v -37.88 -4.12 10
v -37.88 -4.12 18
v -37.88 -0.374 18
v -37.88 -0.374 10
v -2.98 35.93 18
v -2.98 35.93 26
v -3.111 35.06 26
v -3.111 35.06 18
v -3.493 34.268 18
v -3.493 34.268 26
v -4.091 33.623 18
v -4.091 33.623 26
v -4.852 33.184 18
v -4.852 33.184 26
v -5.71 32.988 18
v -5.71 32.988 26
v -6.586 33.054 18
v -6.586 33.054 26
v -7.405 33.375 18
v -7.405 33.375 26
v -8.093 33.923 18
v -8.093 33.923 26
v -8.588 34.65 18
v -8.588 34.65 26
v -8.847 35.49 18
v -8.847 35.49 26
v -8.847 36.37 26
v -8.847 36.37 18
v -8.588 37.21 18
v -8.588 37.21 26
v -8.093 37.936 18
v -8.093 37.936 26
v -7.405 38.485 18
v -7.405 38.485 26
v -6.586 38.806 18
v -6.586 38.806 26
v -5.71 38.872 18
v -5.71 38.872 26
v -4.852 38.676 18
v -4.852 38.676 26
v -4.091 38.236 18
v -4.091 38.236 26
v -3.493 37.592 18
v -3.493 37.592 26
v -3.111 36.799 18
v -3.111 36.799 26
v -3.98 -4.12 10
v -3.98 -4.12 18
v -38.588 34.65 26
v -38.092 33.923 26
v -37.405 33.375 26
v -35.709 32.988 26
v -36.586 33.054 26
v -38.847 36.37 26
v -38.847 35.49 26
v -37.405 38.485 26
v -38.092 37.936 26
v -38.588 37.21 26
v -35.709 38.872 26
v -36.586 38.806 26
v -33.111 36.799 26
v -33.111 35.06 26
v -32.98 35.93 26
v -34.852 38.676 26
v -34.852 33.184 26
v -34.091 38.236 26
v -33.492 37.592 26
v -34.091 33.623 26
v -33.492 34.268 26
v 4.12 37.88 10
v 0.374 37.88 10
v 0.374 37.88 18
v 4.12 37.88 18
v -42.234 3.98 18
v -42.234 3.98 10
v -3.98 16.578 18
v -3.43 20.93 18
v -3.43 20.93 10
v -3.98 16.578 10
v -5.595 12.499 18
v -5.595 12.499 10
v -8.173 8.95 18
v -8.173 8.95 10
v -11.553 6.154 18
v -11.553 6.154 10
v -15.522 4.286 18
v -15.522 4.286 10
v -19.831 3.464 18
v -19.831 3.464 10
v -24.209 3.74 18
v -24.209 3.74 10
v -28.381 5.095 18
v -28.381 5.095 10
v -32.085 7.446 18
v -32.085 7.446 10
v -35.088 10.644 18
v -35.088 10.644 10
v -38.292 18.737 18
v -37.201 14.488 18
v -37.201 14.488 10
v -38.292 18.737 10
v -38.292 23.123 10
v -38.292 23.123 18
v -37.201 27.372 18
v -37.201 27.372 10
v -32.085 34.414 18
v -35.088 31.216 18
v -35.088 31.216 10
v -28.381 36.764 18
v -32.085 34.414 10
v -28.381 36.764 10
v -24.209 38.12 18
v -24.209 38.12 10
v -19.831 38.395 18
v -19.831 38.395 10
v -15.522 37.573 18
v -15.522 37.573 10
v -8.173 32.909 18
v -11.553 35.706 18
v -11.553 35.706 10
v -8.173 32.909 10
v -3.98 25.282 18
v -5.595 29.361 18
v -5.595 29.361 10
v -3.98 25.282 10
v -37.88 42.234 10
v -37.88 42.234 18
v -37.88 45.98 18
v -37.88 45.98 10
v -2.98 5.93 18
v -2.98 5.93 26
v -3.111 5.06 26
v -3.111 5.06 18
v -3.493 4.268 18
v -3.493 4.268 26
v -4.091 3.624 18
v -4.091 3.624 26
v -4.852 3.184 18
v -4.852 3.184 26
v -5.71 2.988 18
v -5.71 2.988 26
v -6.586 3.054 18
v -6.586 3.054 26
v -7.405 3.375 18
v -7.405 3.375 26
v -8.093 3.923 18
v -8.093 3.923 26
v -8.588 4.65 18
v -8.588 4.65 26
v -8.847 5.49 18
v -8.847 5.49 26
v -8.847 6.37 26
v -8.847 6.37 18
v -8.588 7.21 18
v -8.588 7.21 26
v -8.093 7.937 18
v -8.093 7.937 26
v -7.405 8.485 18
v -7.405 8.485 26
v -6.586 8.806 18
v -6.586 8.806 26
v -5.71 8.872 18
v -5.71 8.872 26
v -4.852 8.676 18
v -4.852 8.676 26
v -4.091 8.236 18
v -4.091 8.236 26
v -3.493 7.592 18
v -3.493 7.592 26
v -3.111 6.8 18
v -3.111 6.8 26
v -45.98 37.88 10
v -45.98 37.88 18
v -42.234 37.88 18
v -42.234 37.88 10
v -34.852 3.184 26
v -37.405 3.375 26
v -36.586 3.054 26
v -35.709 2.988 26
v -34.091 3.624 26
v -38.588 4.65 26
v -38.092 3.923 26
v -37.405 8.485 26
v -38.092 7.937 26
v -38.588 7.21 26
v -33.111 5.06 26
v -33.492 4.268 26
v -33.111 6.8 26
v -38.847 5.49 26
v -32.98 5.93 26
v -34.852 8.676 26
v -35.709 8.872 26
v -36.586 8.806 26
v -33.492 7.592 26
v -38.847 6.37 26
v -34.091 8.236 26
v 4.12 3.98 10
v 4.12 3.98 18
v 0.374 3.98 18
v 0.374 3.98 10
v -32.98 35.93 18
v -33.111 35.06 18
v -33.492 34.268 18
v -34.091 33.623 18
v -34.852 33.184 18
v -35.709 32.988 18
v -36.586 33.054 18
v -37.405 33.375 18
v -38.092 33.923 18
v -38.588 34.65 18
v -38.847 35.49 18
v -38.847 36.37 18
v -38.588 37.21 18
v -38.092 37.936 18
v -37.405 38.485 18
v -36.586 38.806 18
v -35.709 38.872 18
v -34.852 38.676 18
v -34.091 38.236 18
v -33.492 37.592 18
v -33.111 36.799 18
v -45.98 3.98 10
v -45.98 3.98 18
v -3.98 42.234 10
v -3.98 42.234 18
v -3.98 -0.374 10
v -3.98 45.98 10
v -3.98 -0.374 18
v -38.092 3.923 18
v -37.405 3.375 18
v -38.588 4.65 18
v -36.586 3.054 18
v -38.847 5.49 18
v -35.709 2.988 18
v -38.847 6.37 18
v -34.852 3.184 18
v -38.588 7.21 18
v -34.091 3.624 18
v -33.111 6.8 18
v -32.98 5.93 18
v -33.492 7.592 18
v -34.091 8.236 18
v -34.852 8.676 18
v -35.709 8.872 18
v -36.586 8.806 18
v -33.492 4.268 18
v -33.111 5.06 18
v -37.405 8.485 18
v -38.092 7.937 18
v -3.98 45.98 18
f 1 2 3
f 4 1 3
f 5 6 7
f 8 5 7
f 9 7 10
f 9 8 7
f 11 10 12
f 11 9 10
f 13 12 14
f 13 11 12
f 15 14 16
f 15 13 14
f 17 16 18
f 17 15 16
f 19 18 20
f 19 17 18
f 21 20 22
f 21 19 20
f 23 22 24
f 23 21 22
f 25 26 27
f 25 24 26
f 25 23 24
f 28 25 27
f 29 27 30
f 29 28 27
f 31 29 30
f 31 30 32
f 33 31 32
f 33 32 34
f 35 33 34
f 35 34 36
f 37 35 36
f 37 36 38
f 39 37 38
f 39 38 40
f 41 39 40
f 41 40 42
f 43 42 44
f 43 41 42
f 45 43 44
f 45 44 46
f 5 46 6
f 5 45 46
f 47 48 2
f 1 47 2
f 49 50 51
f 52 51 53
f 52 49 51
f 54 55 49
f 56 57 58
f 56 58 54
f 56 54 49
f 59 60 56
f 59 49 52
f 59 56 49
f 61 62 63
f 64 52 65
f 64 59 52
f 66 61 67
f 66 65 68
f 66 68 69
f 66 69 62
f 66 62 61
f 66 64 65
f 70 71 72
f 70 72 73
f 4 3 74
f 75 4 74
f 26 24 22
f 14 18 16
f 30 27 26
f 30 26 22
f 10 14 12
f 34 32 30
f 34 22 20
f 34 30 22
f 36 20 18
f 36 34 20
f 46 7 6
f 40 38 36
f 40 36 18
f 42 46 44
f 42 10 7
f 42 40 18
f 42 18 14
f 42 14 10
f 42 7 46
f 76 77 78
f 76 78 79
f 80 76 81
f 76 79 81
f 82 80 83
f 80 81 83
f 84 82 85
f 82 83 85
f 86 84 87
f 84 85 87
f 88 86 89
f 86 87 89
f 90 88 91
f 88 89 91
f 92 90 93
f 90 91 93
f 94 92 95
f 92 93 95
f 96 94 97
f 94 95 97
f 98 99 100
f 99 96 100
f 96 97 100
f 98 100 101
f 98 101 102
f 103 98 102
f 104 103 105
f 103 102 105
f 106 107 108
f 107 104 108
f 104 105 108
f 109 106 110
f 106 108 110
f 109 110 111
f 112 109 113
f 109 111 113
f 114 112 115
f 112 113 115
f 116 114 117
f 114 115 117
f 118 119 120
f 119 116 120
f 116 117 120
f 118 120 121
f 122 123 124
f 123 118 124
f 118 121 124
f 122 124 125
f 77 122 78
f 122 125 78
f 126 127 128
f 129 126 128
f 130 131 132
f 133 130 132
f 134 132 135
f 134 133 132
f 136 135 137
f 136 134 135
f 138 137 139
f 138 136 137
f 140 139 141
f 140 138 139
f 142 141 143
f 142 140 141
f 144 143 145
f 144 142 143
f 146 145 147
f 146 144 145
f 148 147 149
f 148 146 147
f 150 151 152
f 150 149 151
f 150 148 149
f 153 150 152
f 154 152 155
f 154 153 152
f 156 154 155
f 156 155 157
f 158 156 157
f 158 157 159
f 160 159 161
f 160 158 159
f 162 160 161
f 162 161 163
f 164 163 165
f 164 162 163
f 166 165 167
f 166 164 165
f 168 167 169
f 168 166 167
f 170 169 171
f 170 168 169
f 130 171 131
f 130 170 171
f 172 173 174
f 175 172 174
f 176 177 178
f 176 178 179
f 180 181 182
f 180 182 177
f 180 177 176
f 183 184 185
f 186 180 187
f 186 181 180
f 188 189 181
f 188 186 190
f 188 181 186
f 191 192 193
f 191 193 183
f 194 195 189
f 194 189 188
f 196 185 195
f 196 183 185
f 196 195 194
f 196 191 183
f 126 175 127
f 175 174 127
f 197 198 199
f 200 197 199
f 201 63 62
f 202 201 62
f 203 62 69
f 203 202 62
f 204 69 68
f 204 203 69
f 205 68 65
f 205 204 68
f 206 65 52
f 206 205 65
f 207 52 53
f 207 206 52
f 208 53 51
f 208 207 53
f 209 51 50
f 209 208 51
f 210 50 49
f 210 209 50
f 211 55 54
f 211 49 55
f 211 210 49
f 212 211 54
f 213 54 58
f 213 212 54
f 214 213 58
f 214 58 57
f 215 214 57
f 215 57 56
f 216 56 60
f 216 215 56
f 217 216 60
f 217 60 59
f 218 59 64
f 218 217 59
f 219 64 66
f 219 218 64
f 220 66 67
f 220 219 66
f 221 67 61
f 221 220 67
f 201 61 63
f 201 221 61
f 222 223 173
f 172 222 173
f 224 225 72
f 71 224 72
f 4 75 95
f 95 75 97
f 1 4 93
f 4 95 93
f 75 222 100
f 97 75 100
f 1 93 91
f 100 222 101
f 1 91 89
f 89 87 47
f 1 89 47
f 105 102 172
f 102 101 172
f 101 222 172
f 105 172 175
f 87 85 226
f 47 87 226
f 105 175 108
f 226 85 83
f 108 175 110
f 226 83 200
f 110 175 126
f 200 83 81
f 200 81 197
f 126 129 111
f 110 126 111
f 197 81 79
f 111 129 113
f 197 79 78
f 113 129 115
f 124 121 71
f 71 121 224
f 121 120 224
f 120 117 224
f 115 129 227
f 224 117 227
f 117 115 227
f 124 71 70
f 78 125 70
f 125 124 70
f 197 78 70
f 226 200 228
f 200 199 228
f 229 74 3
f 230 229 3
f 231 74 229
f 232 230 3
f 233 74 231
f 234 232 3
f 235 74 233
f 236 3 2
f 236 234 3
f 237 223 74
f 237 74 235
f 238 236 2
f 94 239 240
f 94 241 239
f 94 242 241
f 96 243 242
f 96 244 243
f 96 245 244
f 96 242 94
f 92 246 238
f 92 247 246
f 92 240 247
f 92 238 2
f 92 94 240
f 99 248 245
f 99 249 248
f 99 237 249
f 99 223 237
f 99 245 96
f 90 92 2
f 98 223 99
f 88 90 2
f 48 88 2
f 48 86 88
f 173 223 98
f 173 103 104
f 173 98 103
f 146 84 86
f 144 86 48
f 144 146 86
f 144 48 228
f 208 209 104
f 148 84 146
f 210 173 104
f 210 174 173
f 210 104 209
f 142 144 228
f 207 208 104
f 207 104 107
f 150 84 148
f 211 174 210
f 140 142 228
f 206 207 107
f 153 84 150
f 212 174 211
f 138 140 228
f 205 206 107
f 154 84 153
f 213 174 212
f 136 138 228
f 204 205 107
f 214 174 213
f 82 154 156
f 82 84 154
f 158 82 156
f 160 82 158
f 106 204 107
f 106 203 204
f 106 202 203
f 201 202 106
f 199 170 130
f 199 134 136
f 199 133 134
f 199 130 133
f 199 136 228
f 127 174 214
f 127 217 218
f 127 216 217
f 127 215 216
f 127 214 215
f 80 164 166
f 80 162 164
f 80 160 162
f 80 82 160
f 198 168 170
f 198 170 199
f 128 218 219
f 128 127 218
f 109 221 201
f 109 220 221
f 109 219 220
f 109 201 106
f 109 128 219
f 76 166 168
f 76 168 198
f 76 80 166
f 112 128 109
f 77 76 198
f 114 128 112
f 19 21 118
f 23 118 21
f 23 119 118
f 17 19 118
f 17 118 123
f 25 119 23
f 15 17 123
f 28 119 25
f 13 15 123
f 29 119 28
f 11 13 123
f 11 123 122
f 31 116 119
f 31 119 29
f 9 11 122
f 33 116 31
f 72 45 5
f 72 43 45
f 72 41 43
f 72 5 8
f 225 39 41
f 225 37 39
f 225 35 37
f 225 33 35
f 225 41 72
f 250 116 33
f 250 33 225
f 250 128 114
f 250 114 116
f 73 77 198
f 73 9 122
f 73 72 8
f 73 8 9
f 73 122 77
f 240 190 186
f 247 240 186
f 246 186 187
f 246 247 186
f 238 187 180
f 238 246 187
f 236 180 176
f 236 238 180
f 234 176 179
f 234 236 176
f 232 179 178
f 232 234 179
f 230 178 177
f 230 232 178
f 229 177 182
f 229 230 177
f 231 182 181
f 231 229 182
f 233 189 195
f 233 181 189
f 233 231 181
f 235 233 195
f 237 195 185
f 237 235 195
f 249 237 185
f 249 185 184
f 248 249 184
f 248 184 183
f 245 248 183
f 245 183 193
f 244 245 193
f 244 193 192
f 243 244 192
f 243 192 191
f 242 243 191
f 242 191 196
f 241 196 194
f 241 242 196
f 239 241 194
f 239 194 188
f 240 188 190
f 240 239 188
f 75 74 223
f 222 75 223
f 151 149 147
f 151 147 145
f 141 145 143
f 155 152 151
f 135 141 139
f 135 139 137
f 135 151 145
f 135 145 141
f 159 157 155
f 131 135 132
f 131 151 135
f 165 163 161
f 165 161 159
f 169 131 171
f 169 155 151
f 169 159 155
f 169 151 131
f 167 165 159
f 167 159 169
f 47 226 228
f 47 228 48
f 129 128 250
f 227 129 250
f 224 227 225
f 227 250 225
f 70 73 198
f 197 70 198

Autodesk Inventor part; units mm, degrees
ref_plane "YZ Plane" through (0, 0, 0) normal (1, 0, 0) x (0, 1, 0)
ref_plane "XZ Plane" through (0, 0, 0) normal (0, 1, 0) x (-1, 0, 0)
ref_plane "Work Plane1" through (0, 0, 10) normal (0, 0, 1) x (1, 0, 0)
sketch "Sketch1" plane through (0, 0, 10) normal (0, 0, 1) x (1, 0, 0)
  line L0 (-4.0299, -0.3538) -> (-2.2322, 1.4439) construction
  arc A0 (-1.4439, 2.2322) -> (-2.2322, 1.4439) centre (-0.9299, 0.9299) ccw construction
  line L1 (-1.4439, 2.2322) -> (0.3538, 4.0299) construction
  line L2 (-37.8299, 42.8299) -> (-37.8299, 37.8299) construction
  line L3 (-37.8299, 37.8299) -> (-42.9208, 37.8299) construction
  line L4 (-37.8299, 42.2137) -> (-37.8299, 45.8299) construction
  line L5 (-37.8299, 45.8299) -> (-4.0299, 45.8299) construction
  line L6 (-4.0299, 45.8299) -> (-4.0299, 42.2137) construction
  line L7 (-4.0299, 4.0299) -> (0.3538, 4.0299) projected
  circle A1 centre (-20.9299, 20.9299) radius 17.5 projected
  line L8 (-20.9299, 58.9723) -> (17.1124, 20.9299) construction
  line L9 (17.1124, 20.9299) -> (-20.9299, -17.1124) construction
  line L10 (-20.9299, -17.1124) -> (-58.9723, 20.9299) construction
  line L11 (-58.9723, 20.9299) -> (-20.9299, 58.9723) construction
  line L12 (-20.9299, 58.9723) -> (-20.9299, -17.1124) construction
  line L13 (17.1124, 20.9299) -> (-58.9723, 20.9299) construction
  line L14 (-20.9299, 58.9723) -> (32.8701, 58.9723) construction
  line L15 (-43.4299, 43.4299) -> (1.5701, 43.4299) construction
  line L16 (1.5701, 43.4299) -> (1.5701, -1.5701) construction
  line L17 (1.5701, -1.5701) -> (-43.4299, -1.5701) construction
  line L18 (-43.4299, -1.5701) -> (-43.4299, 43.4299) construction
  line L19 (-43.4299, 43.4299) -> (1.5701, -1.5701) construction
  line L20 (1.5701, 43.4299) -> (-43.4299, -1.5701) construction
  line L21 (-43.4299, 5.3876) -> (-43.4299, 36.4723)
  line L22 (-43.4299, 36.4723) -> (-36.4723, 43.4299)
  line L23 (-36.4723, 43.4299) -> (-5.3876, 43.4299)
  line L24 (-5.3876, 43.4299) -> (1.5701, 36.4723)
  line L25 (1.5701, 36.4723) -> (1.5701, 5.3876)
  line L26 (1.5701, 5.3876) -> (-5.3876, -1.5701)
  line L27 (-5.3876, -1.5701) -> (-36.4723, -1.5701)
  line L28 (-36.4723, -1.5701) -> (-43.4299, 5.3876)
  line L29 (-4.0299, 42.2137) -> (-37.8299, 42.2137) projected
  line L30 (-4.0299, -0.3538) -> (-4.0299, 4.0299) projected
  point P0 (-37.8299, 4.0299)
  point P1 (-20.9299, 20.9299)
  dimension "d18" = 53.8
  dimension "d19" = 45
  dimension "d20" = 53.8
  dimension "d21" = 45
  dimension "d22" = 45
extrude "Extrusion1" add sketch "Sketch1" along normal blind 8
sketch "Sketch2" plane through (0, 0, 18) normal (0, 0, 1) x (1, 0, 0)
  circle A0 centre (-35.9299, 35.9299) radius 3.0099 construction
  circle A1 centre (-5.93, 35.9299) radius 3.0099 construction
  circle A2 centre (-5.93, 5.93) radius 3.0099 construction
  circle A3 centre (-35.9299, 5.93) radius 3.0099 construction
  circle A4 centre (-35.9299, 35.9299) radius 2.95
  circle A5 centre (-5.93, 35.9299) radius 2.95
  circle A6 centre (-5.93, 5.93) radius 2.95
  circle A7 centre (-35.9299, 5.93) radius 2.95
  point P0 (0, 0)
  dimension "d1" = 5.9
  dimension "d31" = 5.9
  dimension "d32" = 5.9
  dimension "d33" = 5.9
ref_plane "Work Plane2" through (-40.9959, 0.8639, 22.2359) normal (0, 0, 1) x (1, 0, 0)
extrude "Extrusion2" add sketch "Sketch2" along normal blind 8
sketch "Sketch3" plane through (0, 0, 10) normal (0, 0, -1) x (-1, 0, 0)
  line L0 (37.8299, -0.4701) -> (37.8299, 4.0299) construction
  line L1 (4.0299, 4.0299) -> (4.0299, -0.4701) construction
  line L2 (37.8299, -0.4701) -> (37.8299, 1.1886) construction
  line L3 (4.0299, -3.9701) -> (4.0299, -0.3538) construction
  line L4 (45.8299, 4.0299) -> (42.2137, 4.0299) construction
  line L5 (-0.3538, 4.0299) -> (-3.9701, 4.0299) construction
  line L6 (-3.9701, 37.8299) -> (-0.3538, 37.8299) construction
  line L7 (4.0299, 42.2137) -> (4.0299, 45.8299) construction
  line L8 (37.8299, 45.8299) -> (37.8299, 42.2137) construction
  line L9 (42.2137, 37.8299) -> (45.8299, 37.8299) construction
  line L10 (40.4657, 37.7299) -> (45.8299, 37.7299)
  line L11 (45.8299, 37.7299) -> (45.8299, 4.1299)
  line L12 (45.8299, 4.1299) -> (40.4657, 4.1299)
  line L13 (40.4657, 4.1299) -> (40.4657, 37.7299)
  line L14 (37.7299, 2.4952) -> (4.1299, 2.4952)
  line L15 (4.1299, 2.4952) -> (4.1299, -3.9701)
  line L16 (4.1299, -3.9701) -> (37.7299, -3.9701)
  line L17 (37.7299, -3.9701) -> (37.7299, 2.4952)
  line L18 (1.8946, 4.1299) -> (-3.9701, 4.1299)
  line L19 (-3.9701, 4.1299) -> (-3.9701, 37.7299)
  line L20 (-3.9701, 37.7299) -> (1.8946, 37.7299)
  line L21 (1.8946, 37.7299) -> (1.8946, 4.1299)
  line L22 (4.1299, 40.7326) -> (37.7299, 40.7326)
  line L23 (37.7299, 40.7326) -> (37.7299, 45.8299)
  line L24 (37.7299, 45.8299) -> (4.1299, 45.8299)
  line L25 (4.1299, 45.8299) -> (4.1299, 40.7326)
  point P0 (0, 0)
  dimension "d23" = 0.1
  dimension "d24" = 0.1
  dimension "d25" = 0.1
  dimension "d26" = 0.1
  dimension "d27" = 0.1
extrude "Extrusion3" add sketch "Sketch3" against normal up to surface (8 mm away)
sketch "Sketch4" plane through (0, 0, 18) normal (0, 0, 1) x (1, 0, 0)
  line L0 (3.9701, 4.1299) -> (0.3124, 4.1299) projected
  line L1 (3.9701, 37.7299) -> (3.9701, 4.1299) projected
  line L2 (0.3124, 37.7299) -> (3.9701, 37.7299) projected
  line L3 (0.3124, 37.7299) -> (-4.1299, 42.1723) projected
  line L4 (-4.1299, 45.8299) -> (-4.1299, 42.1723) projected
  line L5 (-37.7299, 45.8299) -> (-4.1299, 45.8299) projected
  line L6 (-37.7299, 42.1723) -> (-37.7299, 45.8299) projected
  line L7 (-37.7299, 42.1723) -> (-42.1723, 37.7299) projected
  line L8 (-45.8299, 37.7299) -> (-42.1723, 37.7299) projected
  line L9 (-45.8299, 4.1299) -> (-45.8299, 37.7299) projected
  line L10 (-42.1723, 4.1299) -> (-45.8299, 4.1299) projected
  line L11 (-42.1723, 4.1299) -> (-37.7299, -0.3124) projected
  line L12 (-37.7299, -3.9701) -> (-37.7299, -0.3124) projected
  line L13 (-4.1299, -3.9701) -> (-37.7299, -3.9701) projected
  line L14 (-4.1299, -0.3124) -> (-4.1299, -3.9701) projected
  line L15 (-4.1299, -0.3124) -> (0.3124, 4.1299) projected
  circle A0 centre (-20.9299, 20.9299) radius 17.5 projected
  circle A1 centre (-35.9299, 5.93) radius 2.95 projected
  circle A2 centre (-5.93, 35.9299) radius 2.95 projected
  circle A3 centre (-35.9299, 35.9299) radius 2.95 projected
  circle A4 centre (-5.93, 5.93) radius 2.95 projected
  line L16 (-3.9799, 45.9799) -> (-3.9799, 42.2344)
  line L17 (-3.9799, 42.2344) -> (0.3745, 37.8799)
  line L18 (0.3745, 37.8799) -> (4.1201, 37.8799)
  line L19 (4.1201, 37.8799) -> (4.1201, 3.9799)
  line L20 (4.1201, 3.9799) -> (0.3745, 3.9799)
  line L21 (0.3745, 3.9799) -> (-3.9799, -0.3745)
  line L22 (-3.9799, -0.3745) -> (-3.9799, -4.1201)
  line L23 (-3.9799, -4.1201) -> (-37.8799, -4.1201)
  line L24 (-37.8799, -4.1201) -> (-37.8799, -0.3745)
  line L25 (-37.8799, -0.3745) -> (-42.2344, 3.9799)
  line L26 (-42.2344, 3.9799) -> (-45.9799, 3.9799)
  line L27 (-45.9799, 3.9799) -> (-45.9799, 37.8799)
  line L28 (-45.9799, 37.8799) -> (-42.2344, 37.8799)
  line L29 (-42.2344, 37.8799) -> (-37.8799, 42.2344)
  line L30 (-37.8799, 42.2344) -> (-37.8799, 45.9799)
  line L31 (-37.8799, 45.9799) -> (-3.9799, 45.9799)
  point P0 (0, 0)
  dimension "d34" = 0.15
extrude "Extrusion4" add sketch "Sketch4" against normal up to surface (8 mm away) contours L16 L17 L18 L19 L20 L21 L22 L23 L24 L25 L26 L27 L28 L29 L30 L31
ref_plane "Arbeitsebene3" through (-37.8799, 20.9299, 18) normal (0, -1, 0) x (1, 0, 0)
ref_plane "Arbeitsebene4" through (-20.9299, 3.9799, 18) normal (1, 0, 0) x (0, 0, -1)
equation "\"d31\" = d1"
equation "\"d32\" = d1"
equation "\"d33\" = d1"
properties part number "20_Cube_Insert_Thorlabs_Pins"
